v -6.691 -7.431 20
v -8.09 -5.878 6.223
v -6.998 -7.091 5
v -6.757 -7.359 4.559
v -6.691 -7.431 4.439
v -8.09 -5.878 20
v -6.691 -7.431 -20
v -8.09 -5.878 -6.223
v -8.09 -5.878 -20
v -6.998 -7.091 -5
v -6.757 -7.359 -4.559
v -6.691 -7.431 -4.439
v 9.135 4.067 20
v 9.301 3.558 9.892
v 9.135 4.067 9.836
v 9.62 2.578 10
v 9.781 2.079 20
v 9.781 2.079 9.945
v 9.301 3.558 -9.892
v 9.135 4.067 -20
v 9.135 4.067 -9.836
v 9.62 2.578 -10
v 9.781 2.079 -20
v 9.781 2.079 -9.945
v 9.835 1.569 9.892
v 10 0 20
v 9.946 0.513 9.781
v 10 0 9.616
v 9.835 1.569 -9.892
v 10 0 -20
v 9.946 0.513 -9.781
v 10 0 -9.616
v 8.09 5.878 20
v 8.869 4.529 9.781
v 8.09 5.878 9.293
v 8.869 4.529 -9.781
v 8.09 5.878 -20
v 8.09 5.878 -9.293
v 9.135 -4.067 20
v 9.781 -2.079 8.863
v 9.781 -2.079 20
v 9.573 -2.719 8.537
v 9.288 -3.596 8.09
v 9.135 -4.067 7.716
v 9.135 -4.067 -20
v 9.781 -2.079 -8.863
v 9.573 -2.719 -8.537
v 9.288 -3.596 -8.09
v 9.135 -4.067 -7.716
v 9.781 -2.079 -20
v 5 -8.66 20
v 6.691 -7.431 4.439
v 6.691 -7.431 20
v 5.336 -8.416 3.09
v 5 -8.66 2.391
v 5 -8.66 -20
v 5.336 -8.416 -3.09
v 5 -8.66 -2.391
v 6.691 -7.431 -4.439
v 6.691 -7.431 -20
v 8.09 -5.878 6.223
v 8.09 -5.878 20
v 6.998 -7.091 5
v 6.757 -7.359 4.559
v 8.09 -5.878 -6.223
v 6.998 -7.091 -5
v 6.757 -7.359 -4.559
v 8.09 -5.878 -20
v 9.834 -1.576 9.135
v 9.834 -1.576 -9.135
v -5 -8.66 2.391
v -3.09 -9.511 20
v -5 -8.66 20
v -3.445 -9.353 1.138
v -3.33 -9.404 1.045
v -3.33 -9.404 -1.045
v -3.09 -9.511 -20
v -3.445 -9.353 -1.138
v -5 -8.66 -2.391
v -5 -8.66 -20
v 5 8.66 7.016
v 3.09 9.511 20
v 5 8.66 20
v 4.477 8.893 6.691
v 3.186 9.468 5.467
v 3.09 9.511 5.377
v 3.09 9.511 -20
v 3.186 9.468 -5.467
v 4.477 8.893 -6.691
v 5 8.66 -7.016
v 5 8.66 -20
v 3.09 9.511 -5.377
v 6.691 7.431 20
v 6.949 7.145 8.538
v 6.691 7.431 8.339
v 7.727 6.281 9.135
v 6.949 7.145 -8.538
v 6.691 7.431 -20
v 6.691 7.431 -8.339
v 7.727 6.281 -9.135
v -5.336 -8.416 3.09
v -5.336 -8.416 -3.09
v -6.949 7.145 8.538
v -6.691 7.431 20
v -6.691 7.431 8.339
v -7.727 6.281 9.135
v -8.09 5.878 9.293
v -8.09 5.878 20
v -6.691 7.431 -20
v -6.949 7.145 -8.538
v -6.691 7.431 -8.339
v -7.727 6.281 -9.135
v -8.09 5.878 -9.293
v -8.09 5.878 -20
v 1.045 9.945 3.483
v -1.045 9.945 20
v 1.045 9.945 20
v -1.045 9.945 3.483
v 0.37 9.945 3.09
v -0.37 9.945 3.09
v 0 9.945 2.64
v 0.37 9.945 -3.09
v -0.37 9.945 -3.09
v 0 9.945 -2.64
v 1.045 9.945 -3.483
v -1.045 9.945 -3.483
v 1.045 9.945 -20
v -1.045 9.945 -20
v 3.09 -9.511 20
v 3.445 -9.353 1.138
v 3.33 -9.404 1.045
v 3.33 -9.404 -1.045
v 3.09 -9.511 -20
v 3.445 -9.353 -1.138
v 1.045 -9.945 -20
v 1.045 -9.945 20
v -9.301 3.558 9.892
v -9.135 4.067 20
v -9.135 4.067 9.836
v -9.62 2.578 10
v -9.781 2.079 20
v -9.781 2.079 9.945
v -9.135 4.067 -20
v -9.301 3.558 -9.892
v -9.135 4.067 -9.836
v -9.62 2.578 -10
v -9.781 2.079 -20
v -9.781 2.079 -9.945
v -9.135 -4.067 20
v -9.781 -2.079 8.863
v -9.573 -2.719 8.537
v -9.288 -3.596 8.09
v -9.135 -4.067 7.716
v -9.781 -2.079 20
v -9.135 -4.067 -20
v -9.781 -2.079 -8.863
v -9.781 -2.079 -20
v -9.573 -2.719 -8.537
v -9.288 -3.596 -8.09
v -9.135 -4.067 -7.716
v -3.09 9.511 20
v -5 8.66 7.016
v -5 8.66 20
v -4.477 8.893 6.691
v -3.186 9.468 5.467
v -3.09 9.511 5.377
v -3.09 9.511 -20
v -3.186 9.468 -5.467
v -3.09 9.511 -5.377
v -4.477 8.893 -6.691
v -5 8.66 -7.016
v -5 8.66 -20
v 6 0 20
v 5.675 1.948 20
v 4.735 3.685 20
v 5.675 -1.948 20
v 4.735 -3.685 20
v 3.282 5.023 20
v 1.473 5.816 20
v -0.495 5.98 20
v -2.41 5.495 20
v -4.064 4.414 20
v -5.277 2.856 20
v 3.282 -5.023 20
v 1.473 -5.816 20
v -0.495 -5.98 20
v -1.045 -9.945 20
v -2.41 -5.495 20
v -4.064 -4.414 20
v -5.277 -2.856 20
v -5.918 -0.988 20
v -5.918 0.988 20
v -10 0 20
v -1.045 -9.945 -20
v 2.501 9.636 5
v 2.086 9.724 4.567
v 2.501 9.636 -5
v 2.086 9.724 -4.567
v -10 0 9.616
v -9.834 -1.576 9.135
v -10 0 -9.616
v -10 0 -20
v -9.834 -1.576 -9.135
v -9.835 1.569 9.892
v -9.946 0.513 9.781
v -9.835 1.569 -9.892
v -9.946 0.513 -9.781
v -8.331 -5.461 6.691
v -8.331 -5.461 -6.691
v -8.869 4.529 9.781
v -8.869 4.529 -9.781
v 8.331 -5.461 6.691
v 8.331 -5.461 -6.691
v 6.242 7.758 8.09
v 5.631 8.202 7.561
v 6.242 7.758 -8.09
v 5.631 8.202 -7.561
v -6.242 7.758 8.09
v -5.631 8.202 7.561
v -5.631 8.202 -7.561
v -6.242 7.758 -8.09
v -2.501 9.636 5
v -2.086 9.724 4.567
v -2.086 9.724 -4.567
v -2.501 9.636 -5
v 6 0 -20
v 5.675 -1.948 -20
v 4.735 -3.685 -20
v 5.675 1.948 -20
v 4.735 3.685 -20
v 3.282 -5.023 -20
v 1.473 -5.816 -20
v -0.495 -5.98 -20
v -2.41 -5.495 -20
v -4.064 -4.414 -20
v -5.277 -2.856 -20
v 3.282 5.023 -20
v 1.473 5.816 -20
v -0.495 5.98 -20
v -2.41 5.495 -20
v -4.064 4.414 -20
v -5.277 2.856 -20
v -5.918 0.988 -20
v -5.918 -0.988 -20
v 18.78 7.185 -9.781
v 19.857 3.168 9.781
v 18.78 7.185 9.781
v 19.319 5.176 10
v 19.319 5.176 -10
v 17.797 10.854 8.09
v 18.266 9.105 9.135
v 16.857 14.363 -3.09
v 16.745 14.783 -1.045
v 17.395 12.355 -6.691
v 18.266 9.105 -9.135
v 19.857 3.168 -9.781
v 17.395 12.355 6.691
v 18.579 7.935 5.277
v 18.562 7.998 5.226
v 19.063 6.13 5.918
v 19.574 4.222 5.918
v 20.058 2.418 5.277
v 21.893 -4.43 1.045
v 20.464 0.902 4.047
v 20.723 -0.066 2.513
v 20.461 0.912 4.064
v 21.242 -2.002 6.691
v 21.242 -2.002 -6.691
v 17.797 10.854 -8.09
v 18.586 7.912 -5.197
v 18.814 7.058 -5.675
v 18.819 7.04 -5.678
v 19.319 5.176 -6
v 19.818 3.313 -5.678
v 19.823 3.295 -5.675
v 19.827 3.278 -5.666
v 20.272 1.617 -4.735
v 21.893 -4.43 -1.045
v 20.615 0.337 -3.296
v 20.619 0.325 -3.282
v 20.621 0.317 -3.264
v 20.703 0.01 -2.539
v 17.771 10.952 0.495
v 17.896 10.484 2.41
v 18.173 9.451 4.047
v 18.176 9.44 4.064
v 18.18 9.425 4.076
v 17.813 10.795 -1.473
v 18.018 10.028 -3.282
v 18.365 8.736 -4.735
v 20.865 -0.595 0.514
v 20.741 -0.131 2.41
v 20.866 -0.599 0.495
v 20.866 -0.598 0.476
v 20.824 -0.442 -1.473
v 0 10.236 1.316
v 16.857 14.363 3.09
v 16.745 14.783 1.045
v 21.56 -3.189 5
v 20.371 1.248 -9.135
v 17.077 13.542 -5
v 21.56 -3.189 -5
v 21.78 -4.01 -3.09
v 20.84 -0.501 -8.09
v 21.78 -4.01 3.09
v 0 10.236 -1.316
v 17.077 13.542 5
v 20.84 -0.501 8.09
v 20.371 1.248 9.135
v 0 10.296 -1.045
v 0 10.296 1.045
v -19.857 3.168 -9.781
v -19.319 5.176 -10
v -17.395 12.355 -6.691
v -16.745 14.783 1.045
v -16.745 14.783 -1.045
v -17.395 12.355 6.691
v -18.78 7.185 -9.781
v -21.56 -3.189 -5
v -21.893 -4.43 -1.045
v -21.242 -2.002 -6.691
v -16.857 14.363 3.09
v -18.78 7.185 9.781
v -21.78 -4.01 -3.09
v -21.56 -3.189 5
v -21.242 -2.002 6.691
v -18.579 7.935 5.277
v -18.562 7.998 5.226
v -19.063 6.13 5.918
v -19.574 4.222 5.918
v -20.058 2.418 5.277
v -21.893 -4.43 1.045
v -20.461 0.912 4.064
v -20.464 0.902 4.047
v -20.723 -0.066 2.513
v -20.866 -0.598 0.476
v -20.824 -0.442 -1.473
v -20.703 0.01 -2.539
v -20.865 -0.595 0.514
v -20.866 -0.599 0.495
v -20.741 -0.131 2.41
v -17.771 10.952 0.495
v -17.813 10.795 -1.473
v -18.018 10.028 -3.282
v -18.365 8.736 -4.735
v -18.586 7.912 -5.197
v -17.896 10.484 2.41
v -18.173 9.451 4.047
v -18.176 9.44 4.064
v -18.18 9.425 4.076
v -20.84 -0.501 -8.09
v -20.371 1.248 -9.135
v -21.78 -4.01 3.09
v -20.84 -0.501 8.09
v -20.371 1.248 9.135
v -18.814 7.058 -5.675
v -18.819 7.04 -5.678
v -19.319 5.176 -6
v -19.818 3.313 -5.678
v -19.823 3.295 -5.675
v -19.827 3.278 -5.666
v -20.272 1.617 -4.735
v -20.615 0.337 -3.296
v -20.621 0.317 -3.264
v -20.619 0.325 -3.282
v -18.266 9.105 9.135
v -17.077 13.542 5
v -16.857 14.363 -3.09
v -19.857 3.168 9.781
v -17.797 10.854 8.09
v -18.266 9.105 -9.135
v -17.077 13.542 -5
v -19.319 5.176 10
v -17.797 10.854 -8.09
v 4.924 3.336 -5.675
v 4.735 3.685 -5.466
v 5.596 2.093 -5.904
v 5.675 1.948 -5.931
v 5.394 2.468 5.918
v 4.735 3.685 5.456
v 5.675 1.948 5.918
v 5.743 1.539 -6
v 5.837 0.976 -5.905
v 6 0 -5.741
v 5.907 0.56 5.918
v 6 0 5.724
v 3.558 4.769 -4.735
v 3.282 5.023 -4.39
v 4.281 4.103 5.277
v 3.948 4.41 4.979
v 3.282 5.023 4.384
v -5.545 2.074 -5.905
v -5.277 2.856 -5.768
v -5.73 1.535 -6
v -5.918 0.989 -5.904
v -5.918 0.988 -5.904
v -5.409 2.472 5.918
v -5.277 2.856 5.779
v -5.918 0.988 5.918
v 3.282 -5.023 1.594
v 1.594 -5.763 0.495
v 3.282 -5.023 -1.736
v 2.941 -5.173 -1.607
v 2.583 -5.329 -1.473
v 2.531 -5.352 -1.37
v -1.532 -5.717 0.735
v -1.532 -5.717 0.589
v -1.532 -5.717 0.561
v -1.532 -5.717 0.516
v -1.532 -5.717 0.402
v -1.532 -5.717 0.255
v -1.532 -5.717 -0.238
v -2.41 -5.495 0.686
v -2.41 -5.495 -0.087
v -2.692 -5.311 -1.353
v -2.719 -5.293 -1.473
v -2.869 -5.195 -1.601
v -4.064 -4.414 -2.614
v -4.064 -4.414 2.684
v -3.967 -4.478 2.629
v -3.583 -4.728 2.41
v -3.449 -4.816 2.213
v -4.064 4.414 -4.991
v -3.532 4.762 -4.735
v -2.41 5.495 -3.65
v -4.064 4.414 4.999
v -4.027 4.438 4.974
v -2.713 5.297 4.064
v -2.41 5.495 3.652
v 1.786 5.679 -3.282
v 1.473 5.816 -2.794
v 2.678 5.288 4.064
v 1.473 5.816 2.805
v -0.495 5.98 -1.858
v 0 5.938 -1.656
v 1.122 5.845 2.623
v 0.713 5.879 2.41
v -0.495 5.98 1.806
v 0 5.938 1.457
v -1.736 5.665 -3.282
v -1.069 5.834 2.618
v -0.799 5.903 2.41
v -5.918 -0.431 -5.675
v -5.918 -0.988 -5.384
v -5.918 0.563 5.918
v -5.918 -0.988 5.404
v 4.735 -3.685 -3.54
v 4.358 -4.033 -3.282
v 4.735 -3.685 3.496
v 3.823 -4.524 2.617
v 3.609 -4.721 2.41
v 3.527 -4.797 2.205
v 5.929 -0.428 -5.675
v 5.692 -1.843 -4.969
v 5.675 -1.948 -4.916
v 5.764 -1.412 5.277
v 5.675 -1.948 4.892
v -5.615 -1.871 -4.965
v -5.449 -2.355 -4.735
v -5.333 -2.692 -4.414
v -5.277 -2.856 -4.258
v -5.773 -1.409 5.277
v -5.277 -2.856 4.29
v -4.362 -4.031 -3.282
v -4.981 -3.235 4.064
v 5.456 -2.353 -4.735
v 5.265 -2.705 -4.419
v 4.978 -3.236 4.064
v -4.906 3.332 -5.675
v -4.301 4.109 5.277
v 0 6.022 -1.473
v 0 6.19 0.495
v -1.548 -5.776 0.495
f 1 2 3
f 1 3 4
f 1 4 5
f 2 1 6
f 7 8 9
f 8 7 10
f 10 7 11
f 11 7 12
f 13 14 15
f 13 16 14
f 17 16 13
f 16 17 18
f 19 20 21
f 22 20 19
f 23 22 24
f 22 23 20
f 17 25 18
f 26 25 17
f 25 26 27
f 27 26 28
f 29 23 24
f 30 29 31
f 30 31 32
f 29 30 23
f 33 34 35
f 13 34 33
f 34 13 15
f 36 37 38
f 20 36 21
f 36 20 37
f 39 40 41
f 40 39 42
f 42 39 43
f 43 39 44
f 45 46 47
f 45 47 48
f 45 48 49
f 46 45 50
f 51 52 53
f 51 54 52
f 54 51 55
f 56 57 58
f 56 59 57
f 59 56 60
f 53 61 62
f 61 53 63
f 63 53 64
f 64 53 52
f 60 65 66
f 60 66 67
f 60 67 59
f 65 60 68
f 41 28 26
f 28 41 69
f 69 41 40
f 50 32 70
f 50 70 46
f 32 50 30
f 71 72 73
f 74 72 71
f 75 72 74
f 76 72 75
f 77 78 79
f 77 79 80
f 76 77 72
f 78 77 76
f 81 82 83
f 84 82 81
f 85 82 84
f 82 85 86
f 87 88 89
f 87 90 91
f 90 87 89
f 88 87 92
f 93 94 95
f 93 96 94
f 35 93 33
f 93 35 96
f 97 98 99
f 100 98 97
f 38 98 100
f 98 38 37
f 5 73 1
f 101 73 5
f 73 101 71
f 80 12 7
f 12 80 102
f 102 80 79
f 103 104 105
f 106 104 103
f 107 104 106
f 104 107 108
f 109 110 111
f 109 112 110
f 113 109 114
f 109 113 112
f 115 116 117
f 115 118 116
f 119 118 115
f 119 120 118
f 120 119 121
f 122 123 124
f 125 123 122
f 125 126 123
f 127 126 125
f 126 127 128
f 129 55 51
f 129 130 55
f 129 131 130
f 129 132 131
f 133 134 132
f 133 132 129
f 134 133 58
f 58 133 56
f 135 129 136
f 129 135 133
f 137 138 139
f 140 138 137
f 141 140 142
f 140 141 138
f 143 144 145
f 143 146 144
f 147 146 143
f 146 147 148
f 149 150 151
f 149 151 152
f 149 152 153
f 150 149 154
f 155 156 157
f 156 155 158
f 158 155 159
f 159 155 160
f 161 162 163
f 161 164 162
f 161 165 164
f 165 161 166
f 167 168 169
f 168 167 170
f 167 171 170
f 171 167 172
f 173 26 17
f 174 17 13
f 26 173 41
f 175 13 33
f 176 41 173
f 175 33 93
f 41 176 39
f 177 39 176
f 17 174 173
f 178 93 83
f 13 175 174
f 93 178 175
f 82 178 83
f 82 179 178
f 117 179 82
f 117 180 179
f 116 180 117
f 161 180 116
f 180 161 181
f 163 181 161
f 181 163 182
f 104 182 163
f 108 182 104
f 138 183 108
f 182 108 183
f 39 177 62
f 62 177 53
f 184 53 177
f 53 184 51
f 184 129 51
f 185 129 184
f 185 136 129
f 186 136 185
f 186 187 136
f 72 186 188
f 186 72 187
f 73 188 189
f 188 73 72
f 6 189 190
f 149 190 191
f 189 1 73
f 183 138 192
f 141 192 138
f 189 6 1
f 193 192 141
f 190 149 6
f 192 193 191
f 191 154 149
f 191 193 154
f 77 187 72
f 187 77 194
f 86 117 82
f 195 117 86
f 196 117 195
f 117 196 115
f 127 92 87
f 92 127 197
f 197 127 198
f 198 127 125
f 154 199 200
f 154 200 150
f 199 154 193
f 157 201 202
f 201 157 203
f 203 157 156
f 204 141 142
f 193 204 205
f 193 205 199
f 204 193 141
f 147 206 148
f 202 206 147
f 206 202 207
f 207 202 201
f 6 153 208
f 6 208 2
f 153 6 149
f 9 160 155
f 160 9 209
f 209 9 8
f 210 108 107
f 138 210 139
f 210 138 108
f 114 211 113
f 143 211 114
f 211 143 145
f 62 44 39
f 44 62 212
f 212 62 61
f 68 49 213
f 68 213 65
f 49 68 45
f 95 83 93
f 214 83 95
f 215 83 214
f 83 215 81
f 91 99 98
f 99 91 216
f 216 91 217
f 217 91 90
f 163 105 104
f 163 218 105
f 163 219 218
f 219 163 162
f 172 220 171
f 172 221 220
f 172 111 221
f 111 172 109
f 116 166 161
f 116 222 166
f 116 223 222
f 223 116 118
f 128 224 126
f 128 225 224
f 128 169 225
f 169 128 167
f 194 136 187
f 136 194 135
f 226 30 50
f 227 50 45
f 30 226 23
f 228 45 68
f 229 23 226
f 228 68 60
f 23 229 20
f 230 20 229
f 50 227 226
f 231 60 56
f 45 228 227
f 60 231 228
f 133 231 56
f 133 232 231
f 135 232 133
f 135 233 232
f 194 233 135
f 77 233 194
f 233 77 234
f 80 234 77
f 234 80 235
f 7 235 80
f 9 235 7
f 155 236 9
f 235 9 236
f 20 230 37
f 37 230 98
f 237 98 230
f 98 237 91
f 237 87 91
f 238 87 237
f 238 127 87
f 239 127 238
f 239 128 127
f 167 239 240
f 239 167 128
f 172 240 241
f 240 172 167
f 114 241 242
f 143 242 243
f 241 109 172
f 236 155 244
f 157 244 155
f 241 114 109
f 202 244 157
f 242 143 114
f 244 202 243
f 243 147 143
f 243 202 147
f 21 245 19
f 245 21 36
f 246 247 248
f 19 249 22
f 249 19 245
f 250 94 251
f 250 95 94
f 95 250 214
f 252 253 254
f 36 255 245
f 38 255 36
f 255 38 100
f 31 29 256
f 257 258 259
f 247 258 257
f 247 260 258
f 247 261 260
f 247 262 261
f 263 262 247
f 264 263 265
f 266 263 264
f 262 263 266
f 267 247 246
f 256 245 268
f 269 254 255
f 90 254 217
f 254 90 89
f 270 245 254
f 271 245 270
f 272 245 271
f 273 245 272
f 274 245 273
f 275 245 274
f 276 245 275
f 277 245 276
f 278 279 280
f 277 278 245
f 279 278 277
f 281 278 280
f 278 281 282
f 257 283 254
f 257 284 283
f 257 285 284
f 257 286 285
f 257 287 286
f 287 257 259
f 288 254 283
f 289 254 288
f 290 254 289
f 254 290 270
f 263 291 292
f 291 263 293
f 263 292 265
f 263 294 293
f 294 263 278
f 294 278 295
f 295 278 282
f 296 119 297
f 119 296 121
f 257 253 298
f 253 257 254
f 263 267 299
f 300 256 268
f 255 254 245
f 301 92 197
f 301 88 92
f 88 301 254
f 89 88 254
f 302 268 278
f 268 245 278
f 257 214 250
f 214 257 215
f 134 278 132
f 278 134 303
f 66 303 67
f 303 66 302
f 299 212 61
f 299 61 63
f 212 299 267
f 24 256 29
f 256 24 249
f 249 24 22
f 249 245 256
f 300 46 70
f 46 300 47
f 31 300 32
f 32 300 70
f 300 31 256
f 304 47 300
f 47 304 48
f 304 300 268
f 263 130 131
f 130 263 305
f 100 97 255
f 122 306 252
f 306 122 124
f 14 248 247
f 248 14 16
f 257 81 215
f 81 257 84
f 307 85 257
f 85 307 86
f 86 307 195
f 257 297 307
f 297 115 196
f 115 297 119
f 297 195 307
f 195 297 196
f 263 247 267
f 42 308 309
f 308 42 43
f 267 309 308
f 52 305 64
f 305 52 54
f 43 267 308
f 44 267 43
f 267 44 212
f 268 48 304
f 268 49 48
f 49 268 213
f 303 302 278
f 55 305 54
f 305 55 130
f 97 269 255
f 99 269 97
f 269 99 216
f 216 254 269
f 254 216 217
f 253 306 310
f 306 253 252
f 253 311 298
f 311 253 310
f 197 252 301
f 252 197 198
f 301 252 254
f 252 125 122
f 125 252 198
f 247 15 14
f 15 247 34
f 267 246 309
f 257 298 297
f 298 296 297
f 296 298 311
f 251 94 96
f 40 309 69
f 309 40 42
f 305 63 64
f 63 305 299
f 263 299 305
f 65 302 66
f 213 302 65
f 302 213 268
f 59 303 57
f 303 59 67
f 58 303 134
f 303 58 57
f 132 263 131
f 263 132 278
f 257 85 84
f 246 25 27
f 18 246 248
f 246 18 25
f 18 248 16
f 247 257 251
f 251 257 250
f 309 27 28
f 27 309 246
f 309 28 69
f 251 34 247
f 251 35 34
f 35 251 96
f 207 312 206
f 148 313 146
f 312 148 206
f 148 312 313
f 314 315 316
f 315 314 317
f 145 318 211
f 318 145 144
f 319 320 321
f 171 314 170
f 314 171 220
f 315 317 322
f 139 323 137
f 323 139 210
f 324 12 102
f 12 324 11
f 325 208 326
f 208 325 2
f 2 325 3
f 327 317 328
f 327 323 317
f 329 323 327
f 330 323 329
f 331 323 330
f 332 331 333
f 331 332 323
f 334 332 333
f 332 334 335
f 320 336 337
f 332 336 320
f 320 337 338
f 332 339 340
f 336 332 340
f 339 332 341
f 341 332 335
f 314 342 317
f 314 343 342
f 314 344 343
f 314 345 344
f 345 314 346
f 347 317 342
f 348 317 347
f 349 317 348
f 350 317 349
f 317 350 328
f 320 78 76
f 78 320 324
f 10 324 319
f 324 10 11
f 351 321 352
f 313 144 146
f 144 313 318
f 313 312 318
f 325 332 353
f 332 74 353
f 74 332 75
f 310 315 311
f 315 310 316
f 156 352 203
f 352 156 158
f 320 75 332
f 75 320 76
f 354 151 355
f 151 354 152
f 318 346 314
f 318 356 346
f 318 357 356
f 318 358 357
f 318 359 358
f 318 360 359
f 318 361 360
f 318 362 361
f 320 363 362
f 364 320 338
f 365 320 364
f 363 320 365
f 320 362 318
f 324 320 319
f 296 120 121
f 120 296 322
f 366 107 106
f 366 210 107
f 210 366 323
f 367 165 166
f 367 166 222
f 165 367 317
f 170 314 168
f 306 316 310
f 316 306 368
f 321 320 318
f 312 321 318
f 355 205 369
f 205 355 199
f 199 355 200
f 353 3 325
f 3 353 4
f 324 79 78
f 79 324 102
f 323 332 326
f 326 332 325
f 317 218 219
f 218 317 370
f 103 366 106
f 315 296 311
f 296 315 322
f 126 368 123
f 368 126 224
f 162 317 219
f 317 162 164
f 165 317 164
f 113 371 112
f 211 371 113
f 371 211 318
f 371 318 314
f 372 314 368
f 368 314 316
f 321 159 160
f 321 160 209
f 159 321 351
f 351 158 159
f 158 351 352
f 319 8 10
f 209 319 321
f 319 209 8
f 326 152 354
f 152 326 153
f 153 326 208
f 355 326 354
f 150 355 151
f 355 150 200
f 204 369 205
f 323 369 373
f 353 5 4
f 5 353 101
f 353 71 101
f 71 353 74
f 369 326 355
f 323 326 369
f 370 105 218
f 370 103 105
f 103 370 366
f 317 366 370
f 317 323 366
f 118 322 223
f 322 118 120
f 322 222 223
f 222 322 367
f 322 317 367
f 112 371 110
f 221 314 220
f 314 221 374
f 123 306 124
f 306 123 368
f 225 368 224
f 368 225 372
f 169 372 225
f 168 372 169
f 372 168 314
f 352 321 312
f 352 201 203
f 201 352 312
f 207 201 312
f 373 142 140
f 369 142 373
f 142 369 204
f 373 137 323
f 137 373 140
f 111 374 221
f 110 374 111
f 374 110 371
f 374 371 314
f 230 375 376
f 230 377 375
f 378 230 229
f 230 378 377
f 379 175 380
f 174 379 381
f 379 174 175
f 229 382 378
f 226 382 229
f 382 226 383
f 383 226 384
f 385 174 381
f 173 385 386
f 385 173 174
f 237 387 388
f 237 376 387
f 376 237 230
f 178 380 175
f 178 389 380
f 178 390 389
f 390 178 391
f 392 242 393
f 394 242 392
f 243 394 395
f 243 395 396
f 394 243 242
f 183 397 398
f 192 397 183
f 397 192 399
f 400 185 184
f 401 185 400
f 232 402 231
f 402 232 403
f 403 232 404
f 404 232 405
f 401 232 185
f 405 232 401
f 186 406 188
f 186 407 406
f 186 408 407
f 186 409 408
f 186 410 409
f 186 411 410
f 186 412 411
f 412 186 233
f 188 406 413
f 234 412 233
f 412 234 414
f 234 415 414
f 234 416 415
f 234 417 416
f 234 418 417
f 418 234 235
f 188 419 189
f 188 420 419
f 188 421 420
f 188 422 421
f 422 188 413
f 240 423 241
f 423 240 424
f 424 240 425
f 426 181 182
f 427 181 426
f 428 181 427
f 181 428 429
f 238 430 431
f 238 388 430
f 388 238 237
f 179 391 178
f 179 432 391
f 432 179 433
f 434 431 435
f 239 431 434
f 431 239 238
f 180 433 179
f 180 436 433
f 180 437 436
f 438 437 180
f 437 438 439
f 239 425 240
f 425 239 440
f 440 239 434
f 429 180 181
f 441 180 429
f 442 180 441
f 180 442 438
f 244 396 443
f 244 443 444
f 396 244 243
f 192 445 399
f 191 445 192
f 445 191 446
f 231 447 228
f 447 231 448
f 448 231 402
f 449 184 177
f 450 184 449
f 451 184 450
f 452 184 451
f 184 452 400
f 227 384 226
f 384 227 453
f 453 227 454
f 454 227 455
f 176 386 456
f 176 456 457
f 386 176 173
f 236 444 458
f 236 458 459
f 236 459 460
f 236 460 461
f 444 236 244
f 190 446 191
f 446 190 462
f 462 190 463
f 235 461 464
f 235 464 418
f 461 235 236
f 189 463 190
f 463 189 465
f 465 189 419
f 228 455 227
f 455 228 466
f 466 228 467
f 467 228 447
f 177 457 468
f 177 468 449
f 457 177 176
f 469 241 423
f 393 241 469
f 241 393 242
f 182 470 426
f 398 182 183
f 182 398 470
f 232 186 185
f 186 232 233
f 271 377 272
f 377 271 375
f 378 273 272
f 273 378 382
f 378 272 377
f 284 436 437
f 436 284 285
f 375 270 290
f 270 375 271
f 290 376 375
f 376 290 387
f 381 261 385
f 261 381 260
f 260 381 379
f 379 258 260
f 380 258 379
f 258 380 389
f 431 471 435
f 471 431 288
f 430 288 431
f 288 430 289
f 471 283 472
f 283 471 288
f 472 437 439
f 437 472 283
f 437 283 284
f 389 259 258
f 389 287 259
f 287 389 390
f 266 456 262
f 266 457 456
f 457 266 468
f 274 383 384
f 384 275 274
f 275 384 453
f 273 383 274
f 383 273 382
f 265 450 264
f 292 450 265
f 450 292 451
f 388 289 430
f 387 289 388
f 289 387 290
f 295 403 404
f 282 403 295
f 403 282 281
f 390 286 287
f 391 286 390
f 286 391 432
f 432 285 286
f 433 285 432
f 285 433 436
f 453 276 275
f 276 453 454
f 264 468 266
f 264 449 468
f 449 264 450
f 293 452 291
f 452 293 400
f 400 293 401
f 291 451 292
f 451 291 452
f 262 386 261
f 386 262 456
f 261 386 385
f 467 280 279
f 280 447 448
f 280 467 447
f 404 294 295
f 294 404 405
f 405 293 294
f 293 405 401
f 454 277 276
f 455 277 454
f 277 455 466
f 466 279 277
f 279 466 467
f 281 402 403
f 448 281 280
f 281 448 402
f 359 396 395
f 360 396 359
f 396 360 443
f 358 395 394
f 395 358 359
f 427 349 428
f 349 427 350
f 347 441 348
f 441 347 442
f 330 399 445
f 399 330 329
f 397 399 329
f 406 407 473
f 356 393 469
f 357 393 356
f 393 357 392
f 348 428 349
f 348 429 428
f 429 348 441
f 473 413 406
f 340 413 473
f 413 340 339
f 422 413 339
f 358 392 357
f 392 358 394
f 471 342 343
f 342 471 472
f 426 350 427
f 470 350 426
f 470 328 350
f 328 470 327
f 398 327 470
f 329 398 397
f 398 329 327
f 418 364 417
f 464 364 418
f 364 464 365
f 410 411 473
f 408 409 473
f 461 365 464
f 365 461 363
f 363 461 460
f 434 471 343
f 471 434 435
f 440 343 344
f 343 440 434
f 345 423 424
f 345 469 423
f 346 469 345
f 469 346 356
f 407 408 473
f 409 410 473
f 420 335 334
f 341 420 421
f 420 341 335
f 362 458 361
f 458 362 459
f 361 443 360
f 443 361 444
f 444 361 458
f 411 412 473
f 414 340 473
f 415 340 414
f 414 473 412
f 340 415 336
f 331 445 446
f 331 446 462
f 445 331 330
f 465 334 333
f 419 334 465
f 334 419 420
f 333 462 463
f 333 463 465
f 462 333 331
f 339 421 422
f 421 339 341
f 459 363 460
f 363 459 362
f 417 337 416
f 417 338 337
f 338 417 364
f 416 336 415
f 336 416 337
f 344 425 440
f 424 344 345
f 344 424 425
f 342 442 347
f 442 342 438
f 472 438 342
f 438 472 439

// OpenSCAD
rod_diameter = 6;   // in millimeters
wall_thickness = 2;
tube_length = 20;
angle = 15;         // degrees
   
// Connector as a solid object (no holes)
module solid() {
    cylinder(r = rod_diameter + wall_thickness * 2, h = tube_length);
    translate([0, 0, -tube_length]) 
        cylinder(r = rod_diameter + wall_thickness * 2, h = tube_length);
    rotate([0, 90, angle]) 
        cylinder(r = rod_diameter + wall_thickness * 2, h = tube_length);
    rotate([0, 90, 180-angle]) 
        cylinder(r = rod_diameter + wall_thickness * 2, h = tube_length);
}
   
// Object representing the space for the rods.
module hole_cutout() {
    cut_overlap = 0.2; // Extra length to make clean cut out of main shape
    cylinder(r = rod_diameter, h = tube_length + cut_overlap);
    translate([0, 0, -tube_length-cut_overlap]) 
        cylinder(r = rod_diameter, h = tube_length + cut_overlap);
    rotate([0, 90, angle]) 
        cylinder(r = rod_diameter, h = tube_length + cut_overlap);
    rotate([0, 90, 180-angle]) 
        cylinder(r = rod_diameter, h = tube_length + cut_overlap);
}
   
difference() {
    solid();
    hole_cutout();
}
